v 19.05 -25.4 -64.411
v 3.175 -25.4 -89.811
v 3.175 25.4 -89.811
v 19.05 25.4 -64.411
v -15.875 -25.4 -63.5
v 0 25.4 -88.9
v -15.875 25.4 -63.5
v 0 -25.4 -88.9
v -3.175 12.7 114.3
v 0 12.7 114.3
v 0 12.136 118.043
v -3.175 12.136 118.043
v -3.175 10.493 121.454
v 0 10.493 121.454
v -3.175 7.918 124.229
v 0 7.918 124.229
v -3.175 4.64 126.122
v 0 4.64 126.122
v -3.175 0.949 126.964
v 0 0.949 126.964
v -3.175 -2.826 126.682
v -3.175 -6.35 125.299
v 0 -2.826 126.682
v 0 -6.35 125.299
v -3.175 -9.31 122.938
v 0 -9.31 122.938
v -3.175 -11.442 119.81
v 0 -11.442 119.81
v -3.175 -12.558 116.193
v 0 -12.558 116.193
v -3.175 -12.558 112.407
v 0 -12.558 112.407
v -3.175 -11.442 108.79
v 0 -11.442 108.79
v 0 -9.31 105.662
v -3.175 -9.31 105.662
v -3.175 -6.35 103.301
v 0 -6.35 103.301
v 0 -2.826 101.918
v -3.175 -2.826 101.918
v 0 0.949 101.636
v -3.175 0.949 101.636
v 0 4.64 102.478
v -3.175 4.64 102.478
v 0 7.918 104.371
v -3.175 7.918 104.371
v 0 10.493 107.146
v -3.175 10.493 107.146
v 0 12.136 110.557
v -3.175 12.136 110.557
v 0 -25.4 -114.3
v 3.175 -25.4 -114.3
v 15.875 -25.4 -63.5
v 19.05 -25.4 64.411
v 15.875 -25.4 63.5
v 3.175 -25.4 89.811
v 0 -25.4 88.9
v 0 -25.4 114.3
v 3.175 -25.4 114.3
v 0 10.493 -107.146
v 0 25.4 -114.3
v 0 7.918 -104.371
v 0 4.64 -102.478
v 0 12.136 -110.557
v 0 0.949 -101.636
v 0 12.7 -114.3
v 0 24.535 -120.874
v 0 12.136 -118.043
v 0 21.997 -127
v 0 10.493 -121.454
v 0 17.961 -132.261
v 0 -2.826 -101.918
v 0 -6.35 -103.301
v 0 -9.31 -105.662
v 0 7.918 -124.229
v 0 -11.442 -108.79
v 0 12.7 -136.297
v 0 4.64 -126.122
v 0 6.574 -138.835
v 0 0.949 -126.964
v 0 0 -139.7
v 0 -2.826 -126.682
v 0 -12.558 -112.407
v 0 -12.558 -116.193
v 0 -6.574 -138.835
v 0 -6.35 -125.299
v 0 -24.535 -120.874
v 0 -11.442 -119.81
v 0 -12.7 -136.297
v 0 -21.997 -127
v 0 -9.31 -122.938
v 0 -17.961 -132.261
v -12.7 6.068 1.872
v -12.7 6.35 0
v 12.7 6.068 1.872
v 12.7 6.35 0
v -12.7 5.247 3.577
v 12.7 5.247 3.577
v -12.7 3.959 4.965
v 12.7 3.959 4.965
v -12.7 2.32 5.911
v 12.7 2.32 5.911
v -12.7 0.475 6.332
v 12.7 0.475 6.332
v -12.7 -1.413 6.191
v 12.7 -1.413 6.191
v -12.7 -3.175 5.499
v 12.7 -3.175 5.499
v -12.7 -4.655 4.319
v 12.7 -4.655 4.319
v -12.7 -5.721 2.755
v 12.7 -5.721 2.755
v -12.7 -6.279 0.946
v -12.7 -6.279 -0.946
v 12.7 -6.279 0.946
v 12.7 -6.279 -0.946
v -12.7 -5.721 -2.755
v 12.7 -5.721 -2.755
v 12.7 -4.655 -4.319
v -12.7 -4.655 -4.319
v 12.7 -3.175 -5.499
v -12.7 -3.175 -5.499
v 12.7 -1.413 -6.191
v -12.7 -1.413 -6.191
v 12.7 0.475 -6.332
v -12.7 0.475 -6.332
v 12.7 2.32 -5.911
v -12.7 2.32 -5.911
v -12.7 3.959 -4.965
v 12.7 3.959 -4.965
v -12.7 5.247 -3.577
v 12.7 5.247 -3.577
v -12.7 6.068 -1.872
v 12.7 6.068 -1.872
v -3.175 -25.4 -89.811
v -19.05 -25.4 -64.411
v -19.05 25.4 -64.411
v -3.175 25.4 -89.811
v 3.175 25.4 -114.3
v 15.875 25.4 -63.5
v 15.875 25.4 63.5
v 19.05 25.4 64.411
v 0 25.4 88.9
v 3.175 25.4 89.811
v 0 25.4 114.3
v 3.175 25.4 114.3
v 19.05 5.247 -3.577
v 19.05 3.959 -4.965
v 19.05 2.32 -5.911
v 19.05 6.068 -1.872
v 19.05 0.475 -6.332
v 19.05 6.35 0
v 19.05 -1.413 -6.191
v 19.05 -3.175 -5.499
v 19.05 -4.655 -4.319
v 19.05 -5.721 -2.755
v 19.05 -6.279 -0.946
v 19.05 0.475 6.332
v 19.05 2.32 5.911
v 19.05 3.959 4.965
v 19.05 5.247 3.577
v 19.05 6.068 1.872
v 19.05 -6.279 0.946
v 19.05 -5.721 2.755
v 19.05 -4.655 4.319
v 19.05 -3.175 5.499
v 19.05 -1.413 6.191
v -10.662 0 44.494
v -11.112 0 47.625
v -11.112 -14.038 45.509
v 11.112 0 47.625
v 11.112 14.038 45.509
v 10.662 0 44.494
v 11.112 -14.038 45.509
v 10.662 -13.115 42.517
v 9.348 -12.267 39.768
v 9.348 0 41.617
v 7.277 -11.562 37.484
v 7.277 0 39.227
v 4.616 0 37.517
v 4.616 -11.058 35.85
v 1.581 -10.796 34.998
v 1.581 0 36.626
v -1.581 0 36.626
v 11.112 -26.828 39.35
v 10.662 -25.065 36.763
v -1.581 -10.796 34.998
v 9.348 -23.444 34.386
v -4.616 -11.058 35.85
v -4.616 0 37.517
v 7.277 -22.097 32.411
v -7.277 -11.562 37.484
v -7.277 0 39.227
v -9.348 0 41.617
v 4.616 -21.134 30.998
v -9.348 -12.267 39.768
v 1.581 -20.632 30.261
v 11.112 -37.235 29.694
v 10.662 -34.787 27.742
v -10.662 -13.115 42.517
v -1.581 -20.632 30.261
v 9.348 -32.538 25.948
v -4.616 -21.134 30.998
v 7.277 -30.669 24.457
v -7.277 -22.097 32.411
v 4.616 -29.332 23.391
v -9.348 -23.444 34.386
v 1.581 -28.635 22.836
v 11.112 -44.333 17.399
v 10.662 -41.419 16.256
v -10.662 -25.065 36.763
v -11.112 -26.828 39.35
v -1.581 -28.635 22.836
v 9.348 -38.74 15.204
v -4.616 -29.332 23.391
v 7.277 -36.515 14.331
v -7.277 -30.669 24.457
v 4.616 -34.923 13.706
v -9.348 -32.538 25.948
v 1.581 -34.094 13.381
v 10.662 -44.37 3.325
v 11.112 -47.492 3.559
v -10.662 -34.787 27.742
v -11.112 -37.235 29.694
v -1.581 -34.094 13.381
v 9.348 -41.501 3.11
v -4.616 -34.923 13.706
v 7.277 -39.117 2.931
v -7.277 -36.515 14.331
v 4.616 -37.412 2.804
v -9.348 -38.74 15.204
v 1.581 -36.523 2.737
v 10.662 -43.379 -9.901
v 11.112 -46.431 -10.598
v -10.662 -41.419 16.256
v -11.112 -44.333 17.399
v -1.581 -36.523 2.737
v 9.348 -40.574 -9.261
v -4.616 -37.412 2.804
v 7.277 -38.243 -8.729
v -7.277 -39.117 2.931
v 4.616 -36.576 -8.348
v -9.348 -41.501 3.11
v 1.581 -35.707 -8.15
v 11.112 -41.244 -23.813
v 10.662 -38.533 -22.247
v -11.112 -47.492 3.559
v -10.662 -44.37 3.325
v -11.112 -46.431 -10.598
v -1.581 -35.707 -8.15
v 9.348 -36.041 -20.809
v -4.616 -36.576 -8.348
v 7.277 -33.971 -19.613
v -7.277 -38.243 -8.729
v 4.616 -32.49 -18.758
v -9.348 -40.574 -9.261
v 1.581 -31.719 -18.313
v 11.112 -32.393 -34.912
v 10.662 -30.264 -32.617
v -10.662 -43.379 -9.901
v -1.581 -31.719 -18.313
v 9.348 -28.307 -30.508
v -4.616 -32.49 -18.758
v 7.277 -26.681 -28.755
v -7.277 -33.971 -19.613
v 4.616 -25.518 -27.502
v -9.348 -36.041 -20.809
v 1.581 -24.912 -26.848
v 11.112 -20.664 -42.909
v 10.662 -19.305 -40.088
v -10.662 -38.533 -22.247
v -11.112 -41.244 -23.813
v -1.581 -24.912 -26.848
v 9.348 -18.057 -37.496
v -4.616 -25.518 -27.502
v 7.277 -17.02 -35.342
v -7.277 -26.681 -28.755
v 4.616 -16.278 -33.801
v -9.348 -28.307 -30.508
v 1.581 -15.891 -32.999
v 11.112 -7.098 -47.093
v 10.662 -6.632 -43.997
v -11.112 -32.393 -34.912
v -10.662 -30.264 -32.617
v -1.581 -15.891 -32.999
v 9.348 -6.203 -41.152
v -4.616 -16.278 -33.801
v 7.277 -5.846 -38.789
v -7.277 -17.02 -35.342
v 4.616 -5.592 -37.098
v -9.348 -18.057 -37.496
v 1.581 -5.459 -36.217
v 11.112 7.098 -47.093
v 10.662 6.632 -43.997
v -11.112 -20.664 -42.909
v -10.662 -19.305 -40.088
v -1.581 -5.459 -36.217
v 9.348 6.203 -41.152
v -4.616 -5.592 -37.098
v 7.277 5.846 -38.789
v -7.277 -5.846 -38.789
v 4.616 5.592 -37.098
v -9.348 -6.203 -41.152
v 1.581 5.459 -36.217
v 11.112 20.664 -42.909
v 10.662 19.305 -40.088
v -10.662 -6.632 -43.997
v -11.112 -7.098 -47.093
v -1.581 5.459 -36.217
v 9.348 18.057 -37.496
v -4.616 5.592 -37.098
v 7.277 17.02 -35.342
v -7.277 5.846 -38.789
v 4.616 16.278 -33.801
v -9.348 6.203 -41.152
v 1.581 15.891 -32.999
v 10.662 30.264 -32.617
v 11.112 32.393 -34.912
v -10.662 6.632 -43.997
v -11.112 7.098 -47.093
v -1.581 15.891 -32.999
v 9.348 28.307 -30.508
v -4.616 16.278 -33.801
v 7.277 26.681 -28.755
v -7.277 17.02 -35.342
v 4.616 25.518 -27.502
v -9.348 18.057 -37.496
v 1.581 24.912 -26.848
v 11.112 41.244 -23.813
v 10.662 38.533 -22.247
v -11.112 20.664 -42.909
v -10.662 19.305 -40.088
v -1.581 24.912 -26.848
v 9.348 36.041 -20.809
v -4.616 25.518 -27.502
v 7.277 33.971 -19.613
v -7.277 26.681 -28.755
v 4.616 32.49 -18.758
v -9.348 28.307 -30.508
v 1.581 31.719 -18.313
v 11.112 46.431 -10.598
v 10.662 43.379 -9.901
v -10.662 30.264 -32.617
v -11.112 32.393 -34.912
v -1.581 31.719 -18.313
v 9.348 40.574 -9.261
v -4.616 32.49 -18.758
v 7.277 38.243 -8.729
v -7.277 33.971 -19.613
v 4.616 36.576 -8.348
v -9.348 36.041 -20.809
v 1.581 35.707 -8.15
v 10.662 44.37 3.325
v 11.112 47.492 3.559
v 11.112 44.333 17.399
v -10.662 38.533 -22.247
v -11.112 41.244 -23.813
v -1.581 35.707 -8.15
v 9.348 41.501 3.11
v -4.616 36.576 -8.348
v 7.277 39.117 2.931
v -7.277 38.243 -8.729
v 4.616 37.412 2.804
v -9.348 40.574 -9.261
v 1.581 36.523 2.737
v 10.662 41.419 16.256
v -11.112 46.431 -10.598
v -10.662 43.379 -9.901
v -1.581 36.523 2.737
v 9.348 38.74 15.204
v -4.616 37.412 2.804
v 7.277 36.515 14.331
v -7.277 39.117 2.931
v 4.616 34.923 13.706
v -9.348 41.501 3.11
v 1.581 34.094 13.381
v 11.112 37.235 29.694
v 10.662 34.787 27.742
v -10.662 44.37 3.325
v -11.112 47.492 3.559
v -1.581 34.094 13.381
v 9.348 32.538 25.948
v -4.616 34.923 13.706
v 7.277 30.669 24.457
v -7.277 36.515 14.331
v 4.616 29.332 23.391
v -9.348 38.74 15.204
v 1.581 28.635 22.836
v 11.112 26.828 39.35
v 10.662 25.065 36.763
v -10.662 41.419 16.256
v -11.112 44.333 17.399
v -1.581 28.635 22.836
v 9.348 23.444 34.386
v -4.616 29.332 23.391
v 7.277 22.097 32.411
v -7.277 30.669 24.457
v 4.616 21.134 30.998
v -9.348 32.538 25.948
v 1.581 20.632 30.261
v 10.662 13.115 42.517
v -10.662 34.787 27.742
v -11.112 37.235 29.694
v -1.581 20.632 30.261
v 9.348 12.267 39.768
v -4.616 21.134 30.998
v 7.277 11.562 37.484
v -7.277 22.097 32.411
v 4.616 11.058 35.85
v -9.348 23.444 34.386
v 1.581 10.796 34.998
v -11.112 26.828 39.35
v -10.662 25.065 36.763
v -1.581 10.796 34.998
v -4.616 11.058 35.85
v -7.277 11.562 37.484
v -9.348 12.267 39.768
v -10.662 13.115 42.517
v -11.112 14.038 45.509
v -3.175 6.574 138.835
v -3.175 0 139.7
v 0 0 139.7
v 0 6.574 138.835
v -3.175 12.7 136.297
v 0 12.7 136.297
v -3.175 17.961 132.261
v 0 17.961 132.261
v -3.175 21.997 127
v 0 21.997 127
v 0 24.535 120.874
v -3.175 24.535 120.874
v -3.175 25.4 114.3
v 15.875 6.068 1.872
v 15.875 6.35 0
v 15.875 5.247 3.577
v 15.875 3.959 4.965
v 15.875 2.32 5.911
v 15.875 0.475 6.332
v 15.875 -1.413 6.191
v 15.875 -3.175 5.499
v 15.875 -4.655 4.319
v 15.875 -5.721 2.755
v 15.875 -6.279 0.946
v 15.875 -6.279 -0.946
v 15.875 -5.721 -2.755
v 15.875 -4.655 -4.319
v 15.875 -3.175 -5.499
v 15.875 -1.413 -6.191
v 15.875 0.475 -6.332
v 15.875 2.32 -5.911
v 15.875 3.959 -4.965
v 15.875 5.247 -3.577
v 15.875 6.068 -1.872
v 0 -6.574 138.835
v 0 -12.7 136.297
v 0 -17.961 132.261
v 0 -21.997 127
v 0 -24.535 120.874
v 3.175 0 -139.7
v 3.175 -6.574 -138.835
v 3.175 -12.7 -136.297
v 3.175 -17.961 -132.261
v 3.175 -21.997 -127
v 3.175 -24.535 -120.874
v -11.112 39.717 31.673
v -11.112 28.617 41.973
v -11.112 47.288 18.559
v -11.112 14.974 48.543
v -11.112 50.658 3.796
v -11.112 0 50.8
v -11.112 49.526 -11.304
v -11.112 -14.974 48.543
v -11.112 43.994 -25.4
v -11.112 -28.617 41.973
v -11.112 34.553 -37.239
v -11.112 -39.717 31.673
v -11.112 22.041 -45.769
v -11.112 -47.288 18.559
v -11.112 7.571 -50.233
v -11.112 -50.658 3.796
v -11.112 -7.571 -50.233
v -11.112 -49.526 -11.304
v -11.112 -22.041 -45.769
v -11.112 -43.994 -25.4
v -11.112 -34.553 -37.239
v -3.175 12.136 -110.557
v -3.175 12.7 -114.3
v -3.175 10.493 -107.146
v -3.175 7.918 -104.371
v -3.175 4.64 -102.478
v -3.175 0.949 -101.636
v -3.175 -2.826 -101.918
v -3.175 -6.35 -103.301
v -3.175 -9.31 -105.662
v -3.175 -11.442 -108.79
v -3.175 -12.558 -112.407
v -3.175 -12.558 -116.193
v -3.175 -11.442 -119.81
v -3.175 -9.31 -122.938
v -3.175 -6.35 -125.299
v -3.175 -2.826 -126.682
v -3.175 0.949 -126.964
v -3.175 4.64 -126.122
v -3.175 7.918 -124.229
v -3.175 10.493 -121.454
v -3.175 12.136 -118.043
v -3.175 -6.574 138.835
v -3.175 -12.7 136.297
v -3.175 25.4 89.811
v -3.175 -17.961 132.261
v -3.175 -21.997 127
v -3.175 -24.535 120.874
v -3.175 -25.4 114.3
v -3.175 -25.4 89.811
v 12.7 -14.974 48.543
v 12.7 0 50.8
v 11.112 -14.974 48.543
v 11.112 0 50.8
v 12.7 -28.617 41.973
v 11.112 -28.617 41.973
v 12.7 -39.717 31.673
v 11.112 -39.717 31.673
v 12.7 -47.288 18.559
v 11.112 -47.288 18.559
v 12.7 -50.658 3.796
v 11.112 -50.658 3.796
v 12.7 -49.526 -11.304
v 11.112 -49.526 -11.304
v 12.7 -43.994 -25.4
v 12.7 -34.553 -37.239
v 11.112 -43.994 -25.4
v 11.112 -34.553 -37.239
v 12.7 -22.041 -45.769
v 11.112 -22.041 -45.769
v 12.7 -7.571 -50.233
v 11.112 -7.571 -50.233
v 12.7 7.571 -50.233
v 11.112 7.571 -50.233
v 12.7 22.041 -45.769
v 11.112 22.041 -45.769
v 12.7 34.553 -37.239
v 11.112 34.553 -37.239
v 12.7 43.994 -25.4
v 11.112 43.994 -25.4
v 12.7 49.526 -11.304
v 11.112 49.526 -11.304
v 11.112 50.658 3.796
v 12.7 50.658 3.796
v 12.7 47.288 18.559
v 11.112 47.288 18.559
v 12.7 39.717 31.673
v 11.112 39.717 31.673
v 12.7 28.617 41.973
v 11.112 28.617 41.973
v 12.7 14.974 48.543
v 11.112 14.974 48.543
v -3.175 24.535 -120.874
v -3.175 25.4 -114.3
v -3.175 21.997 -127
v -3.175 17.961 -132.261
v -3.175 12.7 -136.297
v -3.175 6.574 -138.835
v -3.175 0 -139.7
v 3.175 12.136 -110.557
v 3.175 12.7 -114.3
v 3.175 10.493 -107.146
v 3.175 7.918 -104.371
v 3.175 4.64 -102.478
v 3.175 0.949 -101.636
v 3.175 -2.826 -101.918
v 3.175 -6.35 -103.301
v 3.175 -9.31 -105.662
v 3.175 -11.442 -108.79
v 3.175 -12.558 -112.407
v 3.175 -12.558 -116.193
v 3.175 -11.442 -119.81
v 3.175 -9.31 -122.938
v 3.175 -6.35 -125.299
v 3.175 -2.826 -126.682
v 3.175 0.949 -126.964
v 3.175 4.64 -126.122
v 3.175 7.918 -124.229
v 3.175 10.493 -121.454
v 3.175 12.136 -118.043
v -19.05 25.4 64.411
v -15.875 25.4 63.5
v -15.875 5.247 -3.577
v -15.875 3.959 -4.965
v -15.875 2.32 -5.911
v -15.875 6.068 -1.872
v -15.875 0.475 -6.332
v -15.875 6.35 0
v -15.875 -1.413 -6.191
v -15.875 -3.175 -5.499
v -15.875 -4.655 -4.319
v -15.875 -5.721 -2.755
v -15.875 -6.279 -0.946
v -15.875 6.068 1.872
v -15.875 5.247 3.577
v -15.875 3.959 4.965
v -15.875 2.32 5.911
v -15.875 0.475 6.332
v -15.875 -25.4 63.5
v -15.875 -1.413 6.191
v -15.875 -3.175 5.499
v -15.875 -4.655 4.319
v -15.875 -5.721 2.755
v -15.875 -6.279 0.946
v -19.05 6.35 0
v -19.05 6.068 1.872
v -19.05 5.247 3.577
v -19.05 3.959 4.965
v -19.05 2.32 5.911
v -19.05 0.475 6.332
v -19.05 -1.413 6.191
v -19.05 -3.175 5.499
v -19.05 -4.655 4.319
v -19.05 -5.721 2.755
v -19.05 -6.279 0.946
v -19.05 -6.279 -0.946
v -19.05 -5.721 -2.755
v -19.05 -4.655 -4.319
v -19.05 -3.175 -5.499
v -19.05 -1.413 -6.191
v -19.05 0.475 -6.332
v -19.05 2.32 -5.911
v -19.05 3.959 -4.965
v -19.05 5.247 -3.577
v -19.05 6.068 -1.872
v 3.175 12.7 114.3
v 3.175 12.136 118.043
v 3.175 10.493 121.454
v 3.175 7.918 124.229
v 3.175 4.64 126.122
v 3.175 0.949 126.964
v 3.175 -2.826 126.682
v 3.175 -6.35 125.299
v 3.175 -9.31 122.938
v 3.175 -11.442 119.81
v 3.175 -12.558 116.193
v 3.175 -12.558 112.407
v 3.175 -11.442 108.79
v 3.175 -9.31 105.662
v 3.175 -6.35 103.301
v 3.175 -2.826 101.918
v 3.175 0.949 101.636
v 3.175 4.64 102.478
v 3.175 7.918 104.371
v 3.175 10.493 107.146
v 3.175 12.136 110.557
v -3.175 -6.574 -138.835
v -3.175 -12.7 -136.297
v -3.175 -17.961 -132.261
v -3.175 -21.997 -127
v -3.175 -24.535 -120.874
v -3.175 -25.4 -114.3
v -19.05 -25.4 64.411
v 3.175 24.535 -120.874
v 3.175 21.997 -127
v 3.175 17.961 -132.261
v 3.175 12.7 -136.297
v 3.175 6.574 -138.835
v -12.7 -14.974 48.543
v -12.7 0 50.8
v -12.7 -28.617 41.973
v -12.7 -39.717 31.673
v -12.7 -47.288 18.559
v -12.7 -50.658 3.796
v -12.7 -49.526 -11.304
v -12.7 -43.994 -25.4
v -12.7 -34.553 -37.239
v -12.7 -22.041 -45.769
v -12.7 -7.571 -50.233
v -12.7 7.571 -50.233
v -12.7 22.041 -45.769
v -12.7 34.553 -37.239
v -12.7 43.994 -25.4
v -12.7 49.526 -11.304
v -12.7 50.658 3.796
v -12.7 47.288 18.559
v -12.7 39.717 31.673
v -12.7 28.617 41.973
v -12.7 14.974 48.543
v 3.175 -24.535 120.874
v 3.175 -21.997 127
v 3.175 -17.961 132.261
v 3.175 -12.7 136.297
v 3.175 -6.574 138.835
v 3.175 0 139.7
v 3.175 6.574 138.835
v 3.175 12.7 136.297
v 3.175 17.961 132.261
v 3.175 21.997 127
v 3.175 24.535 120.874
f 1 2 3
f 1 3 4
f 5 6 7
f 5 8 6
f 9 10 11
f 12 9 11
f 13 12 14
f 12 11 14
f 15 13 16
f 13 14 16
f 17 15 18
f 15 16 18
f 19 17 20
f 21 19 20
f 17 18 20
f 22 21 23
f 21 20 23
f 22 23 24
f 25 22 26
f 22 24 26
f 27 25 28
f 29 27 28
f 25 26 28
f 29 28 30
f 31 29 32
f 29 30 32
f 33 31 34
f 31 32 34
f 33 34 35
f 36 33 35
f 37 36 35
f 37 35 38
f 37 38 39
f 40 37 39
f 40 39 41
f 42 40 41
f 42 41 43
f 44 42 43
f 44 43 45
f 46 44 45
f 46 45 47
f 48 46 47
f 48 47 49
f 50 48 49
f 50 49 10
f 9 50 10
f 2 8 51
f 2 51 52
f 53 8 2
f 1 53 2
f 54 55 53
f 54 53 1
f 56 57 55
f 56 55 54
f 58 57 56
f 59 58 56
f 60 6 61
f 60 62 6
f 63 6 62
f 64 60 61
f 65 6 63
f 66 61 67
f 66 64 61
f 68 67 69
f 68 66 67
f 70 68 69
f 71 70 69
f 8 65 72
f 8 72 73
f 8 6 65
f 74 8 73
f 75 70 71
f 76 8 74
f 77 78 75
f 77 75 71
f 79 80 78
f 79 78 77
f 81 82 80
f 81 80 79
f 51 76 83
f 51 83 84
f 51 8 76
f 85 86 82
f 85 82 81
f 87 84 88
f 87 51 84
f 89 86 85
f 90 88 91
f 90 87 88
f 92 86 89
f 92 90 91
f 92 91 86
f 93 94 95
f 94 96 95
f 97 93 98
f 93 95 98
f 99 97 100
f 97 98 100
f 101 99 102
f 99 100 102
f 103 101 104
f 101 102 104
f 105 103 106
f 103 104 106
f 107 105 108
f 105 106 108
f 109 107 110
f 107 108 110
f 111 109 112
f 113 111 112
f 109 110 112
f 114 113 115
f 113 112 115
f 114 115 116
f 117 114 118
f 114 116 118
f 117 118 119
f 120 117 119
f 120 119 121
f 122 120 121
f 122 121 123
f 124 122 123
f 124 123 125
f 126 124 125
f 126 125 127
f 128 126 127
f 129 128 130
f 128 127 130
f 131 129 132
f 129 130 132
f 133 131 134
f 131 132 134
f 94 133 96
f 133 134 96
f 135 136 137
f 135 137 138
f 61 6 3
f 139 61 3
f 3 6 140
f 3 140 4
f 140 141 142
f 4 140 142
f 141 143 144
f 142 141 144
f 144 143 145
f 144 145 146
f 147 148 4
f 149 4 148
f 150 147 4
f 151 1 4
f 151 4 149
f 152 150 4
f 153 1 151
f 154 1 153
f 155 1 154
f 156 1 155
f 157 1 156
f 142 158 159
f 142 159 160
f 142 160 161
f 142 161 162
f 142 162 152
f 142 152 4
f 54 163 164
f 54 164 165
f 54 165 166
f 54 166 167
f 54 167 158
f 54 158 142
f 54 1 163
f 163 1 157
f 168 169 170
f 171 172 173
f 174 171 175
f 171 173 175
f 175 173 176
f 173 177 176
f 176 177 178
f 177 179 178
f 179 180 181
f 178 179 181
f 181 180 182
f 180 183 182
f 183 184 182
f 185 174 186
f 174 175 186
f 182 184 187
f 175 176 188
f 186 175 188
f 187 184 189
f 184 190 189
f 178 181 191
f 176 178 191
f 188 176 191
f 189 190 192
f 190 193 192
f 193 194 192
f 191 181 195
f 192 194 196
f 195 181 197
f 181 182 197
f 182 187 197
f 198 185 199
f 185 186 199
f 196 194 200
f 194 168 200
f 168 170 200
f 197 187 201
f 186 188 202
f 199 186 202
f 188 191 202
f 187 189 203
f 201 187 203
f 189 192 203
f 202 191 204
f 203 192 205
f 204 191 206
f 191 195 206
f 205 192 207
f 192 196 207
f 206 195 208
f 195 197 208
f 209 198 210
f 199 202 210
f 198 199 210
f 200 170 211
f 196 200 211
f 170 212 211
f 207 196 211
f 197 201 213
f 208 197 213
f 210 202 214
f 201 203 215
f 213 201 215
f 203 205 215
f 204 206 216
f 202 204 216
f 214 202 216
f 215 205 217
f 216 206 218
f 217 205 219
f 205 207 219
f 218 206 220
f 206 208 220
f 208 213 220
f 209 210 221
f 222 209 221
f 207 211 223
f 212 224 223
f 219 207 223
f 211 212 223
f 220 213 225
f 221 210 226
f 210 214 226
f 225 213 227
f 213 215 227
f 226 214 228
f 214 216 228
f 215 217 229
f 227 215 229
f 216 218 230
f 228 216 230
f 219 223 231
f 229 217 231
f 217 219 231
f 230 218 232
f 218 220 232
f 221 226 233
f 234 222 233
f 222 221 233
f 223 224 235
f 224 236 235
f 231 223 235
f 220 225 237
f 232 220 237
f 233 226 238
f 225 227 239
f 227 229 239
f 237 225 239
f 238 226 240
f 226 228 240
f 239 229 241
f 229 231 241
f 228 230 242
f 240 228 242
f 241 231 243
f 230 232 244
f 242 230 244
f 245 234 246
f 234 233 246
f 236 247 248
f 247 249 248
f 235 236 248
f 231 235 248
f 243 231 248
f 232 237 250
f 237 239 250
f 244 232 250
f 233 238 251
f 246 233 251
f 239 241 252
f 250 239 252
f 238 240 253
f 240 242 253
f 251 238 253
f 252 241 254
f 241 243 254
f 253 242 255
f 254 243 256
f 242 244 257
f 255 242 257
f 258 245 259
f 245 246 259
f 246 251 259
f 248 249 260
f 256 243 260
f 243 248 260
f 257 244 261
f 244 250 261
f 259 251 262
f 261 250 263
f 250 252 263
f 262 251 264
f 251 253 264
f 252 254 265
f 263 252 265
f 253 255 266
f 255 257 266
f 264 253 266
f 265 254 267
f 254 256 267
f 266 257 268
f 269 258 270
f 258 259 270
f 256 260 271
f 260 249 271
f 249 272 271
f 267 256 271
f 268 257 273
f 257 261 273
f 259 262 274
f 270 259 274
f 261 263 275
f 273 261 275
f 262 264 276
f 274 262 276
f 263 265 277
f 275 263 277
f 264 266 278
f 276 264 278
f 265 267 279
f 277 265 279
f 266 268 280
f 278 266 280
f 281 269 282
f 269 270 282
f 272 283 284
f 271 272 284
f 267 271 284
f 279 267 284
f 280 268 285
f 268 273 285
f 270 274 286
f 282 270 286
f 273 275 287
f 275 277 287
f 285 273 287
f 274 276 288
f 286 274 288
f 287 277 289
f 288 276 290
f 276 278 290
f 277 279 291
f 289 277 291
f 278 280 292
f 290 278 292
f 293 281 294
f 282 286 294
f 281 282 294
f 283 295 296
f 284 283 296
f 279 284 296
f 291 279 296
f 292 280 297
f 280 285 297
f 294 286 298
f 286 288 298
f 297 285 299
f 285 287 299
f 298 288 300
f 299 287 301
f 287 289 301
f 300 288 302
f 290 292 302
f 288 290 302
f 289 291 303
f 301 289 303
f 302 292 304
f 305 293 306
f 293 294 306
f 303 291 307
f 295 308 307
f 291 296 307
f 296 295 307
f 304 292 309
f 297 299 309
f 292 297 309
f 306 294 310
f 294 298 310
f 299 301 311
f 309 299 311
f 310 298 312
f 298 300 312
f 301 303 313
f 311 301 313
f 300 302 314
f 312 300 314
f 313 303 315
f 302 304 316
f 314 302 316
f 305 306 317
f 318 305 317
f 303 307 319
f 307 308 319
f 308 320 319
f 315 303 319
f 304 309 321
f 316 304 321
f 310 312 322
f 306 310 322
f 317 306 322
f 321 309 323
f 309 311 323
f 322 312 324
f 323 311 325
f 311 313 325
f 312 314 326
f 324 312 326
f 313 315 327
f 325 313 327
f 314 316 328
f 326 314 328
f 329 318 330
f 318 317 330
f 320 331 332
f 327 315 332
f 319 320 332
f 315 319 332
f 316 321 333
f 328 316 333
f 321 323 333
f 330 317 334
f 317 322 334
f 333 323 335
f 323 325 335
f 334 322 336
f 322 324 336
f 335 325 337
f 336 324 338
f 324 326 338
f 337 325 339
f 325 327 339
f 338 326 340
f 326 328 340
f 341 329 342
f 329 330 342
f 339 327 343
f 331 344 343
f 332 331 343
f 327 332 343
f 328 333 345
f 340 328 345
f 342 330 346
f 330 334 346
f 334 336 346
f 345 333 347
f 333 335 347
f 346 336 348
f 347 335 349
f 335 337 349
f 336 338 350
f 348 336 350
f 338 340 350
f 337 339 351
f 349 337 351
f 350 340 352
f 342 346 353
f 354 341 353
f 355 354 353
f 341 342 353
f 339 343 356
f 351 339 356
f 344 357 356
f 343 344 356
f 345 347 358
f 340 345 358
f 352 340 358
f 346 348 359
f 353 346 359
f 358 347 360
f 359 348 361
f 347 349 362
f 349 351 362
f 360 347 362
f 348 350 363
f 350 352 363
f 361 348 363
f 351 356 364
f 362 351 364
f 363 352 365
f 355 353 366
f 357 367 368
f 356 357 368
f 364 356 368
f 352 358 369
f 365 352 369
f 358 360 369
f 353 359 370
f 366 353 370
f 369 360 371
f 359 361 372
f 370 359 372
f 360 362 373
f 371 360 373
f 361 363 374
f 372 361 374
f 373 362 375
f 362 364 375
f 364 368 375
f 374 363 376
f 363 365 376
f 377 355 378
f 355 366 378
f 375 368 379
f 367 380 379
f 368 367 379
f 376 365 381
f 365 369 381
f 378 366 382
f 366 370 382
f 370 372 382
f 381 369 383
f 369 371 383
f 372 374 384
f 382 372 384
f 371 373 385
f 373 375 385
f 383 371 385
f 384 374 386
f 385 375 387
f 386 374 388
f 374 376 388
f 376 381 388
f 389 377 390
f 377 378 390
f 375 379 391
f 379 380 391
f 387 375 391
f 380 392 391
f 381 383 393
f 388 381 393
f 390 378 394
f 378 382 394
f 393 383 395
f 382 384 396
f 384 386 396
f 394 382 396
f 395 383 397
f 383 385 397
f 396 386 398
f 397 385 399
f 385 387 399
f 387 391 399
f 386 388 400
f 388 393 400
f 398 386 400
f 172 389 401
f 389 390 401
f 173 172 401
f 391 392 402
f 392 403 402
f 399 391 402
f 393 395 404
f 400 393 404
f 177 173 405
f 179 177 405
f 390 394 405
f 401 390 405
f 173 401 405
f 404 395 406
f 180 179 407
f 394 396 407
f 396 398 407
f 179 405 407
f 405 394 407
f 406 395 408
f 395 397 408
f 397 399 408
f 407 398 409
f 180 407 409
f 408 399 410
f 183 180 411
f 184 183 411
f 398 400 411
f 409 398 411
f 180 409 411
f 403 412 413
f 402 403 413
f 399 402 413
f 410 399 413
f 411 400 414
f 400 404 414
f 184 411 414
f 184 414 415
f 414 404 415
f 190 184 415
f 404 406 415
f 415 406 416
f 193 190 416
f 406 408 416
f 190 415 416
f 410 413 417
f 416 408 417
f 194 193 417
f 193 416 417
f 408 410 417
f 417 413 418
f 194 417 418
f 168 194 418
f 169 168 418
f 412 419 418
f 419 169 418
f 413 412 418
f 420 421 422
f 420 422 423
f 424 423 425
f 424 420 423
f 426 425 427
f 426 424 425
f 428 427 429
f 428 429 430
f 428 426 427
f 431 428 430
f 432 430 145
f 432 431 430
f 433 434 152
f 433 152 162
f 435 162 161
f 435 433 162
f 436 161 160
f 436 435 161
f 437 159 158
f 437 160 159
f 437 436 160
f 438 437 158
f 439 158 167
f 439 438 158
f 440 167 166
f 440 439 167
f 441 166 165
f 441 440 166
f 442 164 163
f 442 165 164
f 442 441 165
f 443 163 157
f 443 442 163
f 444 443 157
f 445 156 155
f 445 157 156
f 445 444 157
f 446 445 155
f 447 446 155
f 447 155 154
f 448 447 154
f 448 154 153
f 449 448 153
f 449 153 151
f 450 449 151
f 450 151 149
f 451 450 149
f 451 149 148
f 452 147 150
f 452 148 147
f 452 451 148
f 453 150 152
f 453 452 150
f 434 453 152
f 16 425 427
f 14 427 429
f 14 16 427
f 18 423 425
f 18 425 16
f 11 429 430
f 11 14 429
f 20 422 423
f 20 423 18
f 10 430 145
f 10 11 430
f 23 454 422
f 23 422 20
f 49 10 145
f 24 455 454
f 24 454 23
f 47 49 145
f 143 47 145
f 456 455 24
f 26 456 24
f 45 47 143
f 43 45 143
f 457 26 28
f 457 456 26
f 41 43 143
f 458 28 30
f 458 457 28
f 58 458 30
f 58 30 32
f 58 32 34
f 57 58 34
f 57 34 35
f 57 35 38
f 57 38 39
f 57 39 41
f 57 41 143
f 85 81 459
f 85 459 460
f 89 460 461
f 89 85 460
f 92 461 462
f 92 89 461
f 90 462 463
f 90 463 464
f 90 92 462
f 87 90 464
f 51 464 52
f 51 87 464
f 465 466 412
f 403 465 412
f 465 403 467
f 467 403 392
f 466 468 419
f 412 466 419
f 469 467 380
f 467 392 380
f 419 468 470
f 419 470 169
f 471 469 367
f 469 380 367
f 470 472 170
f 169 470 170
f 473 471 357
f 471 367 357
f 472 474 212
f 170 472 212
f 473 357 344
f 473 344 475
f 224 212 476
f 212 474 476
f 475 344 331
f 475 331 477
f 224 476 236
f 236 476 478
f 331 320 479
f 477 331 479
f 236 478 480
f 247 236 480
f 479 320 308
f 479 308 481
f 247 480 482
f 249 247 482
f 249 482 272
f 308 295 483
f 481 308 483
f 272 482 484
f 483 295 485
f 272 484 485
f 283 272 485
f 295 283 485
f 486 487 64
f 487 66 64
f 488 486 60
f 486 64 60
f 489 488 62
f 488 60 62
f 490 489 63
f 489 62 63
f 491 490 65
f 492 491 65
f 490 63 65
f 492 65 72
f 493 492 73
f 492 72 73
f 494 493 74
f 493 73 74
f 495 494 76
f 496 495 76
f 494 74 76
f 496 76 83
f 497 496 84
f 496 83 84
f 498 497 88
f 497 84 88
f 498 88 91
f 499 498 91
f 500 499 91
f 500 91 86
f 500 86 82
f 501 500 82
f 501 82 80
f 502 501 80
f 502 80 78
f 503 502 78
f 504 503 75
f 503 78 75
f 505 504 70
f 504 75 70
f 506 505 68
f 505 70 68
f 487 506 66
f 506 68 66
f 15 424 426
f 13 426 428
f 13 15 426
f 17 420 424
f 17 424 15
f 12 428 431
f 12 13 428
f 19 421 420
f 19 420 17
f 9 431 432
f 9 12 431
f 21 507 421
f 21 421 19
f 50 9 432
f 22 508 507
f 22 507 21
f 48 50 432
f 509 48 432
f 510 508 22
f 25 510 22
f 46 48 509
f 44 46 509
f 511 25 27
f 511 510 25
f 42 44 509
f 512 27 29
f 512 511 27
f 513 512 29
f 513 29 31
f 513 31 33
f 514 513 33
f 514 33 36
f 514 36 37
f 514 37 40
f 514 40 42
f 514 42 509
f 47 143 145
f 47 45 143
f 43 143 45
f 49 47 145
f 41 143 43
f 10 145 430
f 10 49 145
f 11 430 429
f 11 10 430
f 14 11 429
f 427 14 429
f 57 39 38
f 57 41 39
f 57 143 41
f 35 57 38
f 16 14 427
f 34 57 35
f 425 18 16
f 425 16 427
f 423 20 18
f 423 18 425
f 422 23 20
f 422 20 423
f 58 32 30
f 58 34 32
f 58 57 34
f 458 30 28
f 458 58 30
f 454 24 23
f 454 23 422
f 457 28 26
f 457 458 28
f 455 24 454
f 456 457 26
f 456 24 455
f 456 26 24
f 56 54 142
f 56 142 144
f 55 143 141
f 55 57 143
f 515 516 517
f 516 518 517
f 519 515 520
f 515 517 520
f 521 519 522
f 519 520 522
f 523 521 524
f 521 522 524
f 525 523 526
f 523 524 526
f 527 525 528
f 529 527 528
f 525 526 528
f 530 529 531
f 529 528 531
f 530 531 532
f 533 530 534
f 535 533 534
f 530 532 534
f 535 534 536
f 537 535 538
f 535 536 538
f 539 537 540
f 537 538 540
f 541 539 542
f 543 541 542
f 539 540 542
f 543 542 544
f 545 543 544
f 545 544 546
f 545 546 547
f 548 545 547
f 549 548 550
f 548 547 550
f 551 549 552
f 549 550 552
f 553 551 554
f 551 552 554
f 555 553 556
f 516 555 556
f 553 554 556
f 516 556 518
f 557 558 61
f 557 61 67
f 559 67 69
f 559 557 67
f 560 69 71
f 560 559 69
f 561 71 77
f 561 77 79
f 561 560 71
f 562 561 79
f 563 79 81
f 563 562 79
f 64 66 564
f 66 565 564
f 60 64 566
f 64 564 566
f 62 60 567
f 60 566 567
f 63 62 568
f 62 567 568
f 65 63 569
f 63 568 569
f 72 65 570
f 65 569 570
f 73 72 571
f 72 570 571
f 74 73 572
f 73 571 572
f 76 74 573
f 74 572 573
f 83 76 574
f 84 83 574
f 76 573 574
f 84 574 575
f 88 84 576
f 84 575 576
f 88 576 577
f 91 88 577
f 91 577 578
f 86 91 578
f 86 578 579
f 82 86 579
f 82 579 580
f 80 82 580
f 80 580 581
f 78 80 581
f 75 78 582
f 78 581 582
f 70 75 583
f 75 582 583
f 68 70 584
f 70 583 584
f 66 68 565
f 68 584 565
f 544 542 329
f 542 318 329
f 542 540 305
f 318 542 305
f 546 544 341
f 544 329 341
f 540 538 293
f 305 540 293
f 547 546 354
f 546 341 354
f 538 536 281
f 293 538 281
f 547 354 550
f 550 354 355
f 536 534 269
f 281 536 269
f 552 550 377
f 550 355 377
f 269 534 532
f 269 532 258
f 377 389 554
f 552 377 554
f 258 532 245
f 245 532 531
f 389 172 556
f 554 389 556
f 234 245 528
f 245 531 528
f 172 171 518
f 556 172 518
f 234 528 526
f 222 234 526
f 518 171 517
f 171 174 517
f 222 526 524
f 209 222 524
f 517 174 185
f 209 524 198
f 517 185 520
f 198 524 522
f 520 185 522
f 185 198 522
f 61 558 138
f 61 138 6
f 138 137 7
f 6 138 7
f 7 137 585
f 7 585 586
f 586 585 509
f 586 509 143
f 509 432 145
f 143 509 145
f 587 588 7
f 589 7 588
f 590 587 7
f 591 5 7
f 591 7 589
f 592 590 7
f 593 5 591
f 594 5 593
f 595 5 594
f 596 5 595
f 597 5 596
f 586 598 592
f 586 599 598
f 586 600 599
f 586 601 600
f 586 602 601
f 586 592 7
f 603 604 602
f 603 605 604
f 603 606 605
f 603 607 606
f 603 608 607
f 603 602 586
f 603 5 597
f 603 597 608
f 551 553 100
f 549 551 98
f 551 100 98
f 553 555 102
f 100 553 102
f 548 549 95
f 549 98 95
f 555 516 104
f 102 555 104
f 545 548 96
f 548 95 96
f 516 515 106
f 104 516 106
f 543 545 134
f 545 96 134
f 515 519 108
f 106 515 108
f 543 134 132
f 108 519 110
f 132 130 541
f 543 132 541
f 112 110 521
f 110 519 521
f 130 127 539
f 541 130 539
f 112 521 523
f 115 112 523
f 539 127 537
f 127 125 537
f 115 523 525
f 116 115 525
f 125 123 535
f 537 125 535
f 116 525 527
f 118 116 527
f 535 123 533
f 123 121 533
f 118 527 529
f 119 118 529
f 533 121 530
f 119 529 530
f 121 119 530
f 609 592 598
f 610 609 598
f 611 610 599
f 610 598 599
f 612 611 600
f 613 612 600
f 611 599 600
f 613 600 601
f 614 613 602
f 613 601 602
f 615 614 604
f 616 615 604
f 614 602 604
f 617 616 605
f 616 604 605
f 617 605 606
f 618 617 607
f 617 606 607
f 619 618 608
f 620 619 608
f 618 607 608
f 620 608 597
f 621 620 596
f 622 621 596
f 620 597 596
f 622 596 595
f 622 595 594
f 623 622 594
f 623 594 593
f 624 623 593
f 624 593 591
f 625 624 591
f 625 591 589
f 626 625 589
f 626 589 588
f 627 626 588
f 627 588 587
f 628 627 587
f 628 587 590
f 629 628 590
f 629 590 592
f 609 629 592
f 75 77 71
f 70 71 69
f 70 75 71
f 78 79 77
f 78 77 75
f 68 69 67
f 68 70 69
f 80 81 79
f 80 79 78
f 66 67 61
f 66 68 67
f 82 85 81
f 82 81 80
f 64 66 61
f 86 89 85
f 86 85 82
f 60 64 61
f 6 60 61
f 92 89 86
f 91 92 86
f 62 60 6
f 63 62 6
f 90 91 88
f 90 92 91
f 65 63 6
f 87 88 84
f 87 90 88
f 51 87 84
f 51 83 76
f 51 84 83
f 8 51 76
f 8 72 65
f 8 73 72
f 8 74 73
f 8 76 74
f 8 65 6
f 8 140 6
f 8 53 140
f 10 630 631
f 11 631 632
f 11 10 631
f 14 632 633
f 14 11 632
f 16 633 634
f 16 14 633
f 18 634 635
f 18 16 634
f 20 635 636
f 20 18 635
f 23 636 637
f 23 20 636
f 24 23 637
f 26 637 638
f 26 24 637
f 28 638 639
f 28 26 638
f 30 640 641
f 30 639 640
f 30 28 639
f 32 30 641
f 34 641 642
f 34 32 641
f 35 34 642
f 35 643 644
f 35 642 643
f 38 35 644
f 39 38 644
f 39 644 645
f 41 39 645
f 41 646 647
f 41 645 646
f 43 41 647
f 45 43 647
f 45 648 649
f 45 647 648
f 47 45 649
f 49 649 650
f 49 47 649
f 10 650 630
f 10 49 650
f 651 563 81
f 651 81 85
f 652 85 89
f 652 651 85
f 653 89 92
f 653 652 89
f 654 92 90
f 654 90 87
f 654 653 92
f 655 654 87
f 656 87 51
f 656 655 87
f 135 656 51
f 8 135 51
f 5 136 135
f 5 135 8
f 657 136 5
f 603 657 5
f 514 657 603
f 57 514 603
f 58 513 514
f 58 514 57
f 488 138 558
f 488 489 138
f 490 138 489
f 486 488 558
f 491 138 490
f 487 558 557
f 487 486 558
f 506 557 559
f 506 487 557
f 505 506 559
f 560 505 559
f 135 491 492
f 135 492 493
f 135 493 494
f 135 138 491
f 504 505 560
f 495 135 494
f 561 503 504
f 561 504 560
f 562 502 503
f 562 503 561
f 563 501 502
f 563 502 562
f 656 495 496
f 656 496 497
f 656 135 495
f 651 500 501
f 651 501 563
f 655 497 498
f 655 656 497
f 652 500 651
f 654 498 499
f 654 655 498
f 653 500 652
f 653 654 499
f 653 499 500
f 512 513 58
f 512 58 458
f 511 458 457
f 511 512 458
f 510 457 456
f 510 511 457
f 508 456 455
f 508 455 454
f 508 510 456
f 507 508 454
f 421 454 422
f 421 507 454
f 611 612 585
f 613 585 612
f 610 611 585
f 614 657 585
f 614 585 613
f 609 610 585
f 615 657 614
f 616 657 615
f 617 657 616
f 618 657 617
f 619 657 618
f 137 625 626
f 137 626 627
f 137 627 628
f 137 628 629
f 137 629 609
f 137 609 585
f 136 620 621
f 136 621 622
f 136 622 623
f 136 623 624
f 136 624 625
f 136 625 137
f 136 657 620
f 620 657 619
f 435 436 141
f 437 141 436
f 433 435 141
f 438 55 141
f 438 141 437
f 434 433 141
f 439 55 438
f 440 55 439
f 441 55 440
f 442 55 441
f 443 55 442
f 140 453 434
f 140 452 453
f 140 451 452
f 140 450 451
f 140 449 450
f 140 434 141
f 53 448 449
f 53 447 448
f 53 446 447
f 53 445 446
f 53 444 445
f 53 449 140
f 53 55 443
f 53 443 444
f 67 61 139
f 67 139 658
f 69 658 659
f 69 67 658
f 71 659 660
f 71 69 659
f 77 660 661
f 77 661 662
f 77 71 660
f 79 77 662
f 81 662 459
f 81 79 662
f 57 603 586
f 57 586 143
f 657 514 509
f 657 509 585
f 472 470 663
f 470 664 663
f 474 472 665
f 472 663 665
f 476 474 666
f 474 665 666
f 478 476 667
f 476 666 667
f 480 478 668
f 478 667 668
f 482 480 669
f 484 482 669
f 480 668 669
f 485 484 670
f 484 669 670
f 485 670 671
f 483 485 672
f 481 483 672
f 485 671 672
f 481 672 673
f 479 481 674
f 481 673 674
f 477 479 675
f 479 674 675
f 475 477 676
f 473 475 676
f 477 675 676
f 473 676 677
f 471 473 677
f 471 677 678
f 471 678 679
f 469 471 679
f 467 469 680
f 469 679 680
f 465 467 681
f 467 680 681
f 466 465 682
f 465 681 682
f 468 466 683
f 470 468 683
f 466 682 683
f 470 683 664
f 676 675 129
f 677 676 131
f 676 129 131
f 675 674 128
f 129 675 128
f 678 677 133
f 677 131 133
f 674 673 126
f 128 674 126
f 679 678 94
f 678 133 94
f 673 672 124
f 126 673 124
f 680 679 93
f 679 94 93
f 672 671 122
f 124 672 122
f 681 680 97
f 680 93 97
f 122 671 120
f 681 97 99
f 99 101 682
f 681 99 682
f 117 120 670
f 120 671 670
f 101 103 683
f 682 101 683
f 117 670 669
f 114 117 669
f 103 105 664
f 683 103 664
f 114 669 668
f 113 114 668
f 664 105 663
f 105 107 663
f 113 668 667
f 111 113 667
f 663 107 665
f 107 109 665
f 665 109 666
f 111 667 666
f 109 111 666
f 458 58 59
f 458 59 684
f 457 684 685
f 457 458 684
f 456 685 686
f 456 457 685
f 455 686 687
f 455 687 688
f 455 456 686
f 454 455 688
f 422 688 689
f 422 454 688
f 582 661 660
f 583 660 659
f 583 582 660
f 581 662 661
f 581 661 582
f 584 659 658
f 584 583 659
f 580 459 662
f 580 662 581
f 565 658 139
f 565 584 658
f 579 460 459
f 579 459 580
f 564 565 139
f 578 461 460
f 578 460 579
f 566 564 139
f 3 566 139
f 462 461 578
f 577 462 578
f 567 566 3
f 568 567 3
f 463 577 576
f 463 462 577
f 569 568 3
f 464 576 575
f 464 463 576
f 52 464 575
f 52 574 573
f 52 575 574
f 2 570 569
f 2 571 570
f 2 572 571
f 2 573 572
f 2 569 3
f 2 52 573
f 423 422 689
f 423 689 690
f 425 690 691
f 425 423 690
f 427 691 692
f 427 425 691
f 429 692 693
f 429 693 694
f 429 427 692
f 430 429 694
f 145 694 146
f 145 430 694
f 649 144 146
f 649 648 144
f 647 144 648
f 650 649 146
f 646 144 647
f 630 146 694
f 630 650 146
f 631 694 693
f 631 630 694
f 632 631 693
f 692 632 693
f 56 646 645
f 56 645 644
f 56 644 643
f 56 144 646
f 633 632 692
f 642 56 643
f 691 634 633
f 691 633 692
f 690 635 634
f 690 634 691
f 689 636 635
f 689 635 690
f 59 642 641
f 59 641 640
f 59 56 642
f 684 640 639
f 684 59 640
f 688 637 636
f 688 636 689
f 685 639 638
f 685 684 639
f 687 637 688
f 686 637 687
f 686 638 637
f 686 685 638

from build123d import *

# Parameters (mm, degrees)
F3_DEPTH = 25.4
F4_DEPTH = 25.4
F5_R     = 6.35
F5_R_2   = 12.7
F6_DEPTH = 25.4


with BuildPart() as f1:
    # F0 (on Front) → F1 (revolve)
    with BuildSketch(Plane.XZ):
        with BuildLine():
            Line((-12.7, 50.8), (-12.7, 0))
            Line((-12.7, 0), (12.7, 0))
            Line((12.7, 0), (12.7, 50.8))
            Line((12.7, 50.8), (11.1125, 50.8))
            Line((11.1125, 50.8), (11.1125, 47.625))
            ThreePointArc((11.1125, 47.625), (0, 36.5125), (-11.1125, 47.625))
            Line((-11.1125, 47.625), (-11.1125, 50.8))
            Line((-11.1125, 50.8), (-12.7, 50.8))
        make_face()
    revolve(axis=Axis((0, 0, 0), (1, 0, 0)))


with BuildPart() as f3:
    # F2 (on Front) → F3 (new body, symmetric)
    with BuildSketch(Plane.XZ):
        Polygon((15.875, -63.5), (0, -88.9), (0, -139.7), (3.175, -139.7), (3.175, -89.810578), (19.05, -64.410578), (19.05, 64.410578), (3.175, 89.810578), (3.175, 139.7), (0, 139.7), (0, 88.9), (15.875, 63.5), align=None)
    extrude(amount=F3_DEPTH, both=True)


with BuildPart() as f4:
    # F2 (on Front) → F4 (new body, symmetric)
    with BuildSketch(Plane.XZ):
        Polygon((0, -88.9), (-15.875, -63.5), (-15.875, 63.5), (0, 88.9), (0, 139.7), (-3.175, 139.7), (-3.175, 89.810578), (-19.05, 64.410578), (-19.05, -64.410578), (-3.175, -89.810578), (-3.175, -139.7), (0, -139.7), align=None)
    extrude(amount=F4_DEPTH, both=True)


with BuildPart() as f6_tool:
    # F5 (on Right) → F6 (new body, symmetric)
    with BuildSketch(Plane.YZ):
        with BuildLine():
            Line((25.4, 139.7), (0, 139.7))
            ThreePointArc((0, 139.7), (17.960512, 132.260512), (25.4, 114.3))
            Line((25.4, 114.3), (25.4, 139.7))
        make_face()
        with BuildLine():
            ThreePointArc((-25.4, 114.3), (-17.960512, 132.260512), (0, 139.7))
            Line((0, 139.7), (-25.4, 139.7))
            Line((-25.4, 139.7), (-25.4, 114.3))
        make_face()
        with BuildLine():
            Line((25.4, -139.7), (25.4, -114.3))
            ThreePointArc((25.4, -114.3), (17.960512, -132.260512), (0, -139.7))
            Line((0, -139.7), (25.4, -139.7))
        make_face()
        with BuildLine():
            Line((-25.4, -139.7), (0, -139.7))
            ThreePointArc((0, -139.7), (-17.960512, -132.260512), (-25.4, -114.3))
            Line((-25.4, -114.3), (-25.4, -139.7))
        make_face()
        Circle(F5_R)
        with Locations((0, 114.3)):
            Circle(F5_R_2)
        with Locations((0, -114.3)):
            Circle(F5_R_2)
    extrude(amount=F6_DEPTH, both=True)


with BuildPart() as f1_1:
    add(f1.part)

    # F6: cut by f6_tool
    add(f6_tool.part, mode=Mode.SUBTRACT)


with BuildPart() as f3_1:
    add(f3.part)

    # F6: cut by f6_tool
    add(f6_tool.part, mode=Mode.SUBTRACT)


with BuildPart() as f4_1:
    add(f4.part)

    # F6: cut by f6_tool
    add(f6_tool.part, mode=Mode.SUBTRACT)


solid = Compound([f1_1.part, f3_1.part, f4_1.part])
